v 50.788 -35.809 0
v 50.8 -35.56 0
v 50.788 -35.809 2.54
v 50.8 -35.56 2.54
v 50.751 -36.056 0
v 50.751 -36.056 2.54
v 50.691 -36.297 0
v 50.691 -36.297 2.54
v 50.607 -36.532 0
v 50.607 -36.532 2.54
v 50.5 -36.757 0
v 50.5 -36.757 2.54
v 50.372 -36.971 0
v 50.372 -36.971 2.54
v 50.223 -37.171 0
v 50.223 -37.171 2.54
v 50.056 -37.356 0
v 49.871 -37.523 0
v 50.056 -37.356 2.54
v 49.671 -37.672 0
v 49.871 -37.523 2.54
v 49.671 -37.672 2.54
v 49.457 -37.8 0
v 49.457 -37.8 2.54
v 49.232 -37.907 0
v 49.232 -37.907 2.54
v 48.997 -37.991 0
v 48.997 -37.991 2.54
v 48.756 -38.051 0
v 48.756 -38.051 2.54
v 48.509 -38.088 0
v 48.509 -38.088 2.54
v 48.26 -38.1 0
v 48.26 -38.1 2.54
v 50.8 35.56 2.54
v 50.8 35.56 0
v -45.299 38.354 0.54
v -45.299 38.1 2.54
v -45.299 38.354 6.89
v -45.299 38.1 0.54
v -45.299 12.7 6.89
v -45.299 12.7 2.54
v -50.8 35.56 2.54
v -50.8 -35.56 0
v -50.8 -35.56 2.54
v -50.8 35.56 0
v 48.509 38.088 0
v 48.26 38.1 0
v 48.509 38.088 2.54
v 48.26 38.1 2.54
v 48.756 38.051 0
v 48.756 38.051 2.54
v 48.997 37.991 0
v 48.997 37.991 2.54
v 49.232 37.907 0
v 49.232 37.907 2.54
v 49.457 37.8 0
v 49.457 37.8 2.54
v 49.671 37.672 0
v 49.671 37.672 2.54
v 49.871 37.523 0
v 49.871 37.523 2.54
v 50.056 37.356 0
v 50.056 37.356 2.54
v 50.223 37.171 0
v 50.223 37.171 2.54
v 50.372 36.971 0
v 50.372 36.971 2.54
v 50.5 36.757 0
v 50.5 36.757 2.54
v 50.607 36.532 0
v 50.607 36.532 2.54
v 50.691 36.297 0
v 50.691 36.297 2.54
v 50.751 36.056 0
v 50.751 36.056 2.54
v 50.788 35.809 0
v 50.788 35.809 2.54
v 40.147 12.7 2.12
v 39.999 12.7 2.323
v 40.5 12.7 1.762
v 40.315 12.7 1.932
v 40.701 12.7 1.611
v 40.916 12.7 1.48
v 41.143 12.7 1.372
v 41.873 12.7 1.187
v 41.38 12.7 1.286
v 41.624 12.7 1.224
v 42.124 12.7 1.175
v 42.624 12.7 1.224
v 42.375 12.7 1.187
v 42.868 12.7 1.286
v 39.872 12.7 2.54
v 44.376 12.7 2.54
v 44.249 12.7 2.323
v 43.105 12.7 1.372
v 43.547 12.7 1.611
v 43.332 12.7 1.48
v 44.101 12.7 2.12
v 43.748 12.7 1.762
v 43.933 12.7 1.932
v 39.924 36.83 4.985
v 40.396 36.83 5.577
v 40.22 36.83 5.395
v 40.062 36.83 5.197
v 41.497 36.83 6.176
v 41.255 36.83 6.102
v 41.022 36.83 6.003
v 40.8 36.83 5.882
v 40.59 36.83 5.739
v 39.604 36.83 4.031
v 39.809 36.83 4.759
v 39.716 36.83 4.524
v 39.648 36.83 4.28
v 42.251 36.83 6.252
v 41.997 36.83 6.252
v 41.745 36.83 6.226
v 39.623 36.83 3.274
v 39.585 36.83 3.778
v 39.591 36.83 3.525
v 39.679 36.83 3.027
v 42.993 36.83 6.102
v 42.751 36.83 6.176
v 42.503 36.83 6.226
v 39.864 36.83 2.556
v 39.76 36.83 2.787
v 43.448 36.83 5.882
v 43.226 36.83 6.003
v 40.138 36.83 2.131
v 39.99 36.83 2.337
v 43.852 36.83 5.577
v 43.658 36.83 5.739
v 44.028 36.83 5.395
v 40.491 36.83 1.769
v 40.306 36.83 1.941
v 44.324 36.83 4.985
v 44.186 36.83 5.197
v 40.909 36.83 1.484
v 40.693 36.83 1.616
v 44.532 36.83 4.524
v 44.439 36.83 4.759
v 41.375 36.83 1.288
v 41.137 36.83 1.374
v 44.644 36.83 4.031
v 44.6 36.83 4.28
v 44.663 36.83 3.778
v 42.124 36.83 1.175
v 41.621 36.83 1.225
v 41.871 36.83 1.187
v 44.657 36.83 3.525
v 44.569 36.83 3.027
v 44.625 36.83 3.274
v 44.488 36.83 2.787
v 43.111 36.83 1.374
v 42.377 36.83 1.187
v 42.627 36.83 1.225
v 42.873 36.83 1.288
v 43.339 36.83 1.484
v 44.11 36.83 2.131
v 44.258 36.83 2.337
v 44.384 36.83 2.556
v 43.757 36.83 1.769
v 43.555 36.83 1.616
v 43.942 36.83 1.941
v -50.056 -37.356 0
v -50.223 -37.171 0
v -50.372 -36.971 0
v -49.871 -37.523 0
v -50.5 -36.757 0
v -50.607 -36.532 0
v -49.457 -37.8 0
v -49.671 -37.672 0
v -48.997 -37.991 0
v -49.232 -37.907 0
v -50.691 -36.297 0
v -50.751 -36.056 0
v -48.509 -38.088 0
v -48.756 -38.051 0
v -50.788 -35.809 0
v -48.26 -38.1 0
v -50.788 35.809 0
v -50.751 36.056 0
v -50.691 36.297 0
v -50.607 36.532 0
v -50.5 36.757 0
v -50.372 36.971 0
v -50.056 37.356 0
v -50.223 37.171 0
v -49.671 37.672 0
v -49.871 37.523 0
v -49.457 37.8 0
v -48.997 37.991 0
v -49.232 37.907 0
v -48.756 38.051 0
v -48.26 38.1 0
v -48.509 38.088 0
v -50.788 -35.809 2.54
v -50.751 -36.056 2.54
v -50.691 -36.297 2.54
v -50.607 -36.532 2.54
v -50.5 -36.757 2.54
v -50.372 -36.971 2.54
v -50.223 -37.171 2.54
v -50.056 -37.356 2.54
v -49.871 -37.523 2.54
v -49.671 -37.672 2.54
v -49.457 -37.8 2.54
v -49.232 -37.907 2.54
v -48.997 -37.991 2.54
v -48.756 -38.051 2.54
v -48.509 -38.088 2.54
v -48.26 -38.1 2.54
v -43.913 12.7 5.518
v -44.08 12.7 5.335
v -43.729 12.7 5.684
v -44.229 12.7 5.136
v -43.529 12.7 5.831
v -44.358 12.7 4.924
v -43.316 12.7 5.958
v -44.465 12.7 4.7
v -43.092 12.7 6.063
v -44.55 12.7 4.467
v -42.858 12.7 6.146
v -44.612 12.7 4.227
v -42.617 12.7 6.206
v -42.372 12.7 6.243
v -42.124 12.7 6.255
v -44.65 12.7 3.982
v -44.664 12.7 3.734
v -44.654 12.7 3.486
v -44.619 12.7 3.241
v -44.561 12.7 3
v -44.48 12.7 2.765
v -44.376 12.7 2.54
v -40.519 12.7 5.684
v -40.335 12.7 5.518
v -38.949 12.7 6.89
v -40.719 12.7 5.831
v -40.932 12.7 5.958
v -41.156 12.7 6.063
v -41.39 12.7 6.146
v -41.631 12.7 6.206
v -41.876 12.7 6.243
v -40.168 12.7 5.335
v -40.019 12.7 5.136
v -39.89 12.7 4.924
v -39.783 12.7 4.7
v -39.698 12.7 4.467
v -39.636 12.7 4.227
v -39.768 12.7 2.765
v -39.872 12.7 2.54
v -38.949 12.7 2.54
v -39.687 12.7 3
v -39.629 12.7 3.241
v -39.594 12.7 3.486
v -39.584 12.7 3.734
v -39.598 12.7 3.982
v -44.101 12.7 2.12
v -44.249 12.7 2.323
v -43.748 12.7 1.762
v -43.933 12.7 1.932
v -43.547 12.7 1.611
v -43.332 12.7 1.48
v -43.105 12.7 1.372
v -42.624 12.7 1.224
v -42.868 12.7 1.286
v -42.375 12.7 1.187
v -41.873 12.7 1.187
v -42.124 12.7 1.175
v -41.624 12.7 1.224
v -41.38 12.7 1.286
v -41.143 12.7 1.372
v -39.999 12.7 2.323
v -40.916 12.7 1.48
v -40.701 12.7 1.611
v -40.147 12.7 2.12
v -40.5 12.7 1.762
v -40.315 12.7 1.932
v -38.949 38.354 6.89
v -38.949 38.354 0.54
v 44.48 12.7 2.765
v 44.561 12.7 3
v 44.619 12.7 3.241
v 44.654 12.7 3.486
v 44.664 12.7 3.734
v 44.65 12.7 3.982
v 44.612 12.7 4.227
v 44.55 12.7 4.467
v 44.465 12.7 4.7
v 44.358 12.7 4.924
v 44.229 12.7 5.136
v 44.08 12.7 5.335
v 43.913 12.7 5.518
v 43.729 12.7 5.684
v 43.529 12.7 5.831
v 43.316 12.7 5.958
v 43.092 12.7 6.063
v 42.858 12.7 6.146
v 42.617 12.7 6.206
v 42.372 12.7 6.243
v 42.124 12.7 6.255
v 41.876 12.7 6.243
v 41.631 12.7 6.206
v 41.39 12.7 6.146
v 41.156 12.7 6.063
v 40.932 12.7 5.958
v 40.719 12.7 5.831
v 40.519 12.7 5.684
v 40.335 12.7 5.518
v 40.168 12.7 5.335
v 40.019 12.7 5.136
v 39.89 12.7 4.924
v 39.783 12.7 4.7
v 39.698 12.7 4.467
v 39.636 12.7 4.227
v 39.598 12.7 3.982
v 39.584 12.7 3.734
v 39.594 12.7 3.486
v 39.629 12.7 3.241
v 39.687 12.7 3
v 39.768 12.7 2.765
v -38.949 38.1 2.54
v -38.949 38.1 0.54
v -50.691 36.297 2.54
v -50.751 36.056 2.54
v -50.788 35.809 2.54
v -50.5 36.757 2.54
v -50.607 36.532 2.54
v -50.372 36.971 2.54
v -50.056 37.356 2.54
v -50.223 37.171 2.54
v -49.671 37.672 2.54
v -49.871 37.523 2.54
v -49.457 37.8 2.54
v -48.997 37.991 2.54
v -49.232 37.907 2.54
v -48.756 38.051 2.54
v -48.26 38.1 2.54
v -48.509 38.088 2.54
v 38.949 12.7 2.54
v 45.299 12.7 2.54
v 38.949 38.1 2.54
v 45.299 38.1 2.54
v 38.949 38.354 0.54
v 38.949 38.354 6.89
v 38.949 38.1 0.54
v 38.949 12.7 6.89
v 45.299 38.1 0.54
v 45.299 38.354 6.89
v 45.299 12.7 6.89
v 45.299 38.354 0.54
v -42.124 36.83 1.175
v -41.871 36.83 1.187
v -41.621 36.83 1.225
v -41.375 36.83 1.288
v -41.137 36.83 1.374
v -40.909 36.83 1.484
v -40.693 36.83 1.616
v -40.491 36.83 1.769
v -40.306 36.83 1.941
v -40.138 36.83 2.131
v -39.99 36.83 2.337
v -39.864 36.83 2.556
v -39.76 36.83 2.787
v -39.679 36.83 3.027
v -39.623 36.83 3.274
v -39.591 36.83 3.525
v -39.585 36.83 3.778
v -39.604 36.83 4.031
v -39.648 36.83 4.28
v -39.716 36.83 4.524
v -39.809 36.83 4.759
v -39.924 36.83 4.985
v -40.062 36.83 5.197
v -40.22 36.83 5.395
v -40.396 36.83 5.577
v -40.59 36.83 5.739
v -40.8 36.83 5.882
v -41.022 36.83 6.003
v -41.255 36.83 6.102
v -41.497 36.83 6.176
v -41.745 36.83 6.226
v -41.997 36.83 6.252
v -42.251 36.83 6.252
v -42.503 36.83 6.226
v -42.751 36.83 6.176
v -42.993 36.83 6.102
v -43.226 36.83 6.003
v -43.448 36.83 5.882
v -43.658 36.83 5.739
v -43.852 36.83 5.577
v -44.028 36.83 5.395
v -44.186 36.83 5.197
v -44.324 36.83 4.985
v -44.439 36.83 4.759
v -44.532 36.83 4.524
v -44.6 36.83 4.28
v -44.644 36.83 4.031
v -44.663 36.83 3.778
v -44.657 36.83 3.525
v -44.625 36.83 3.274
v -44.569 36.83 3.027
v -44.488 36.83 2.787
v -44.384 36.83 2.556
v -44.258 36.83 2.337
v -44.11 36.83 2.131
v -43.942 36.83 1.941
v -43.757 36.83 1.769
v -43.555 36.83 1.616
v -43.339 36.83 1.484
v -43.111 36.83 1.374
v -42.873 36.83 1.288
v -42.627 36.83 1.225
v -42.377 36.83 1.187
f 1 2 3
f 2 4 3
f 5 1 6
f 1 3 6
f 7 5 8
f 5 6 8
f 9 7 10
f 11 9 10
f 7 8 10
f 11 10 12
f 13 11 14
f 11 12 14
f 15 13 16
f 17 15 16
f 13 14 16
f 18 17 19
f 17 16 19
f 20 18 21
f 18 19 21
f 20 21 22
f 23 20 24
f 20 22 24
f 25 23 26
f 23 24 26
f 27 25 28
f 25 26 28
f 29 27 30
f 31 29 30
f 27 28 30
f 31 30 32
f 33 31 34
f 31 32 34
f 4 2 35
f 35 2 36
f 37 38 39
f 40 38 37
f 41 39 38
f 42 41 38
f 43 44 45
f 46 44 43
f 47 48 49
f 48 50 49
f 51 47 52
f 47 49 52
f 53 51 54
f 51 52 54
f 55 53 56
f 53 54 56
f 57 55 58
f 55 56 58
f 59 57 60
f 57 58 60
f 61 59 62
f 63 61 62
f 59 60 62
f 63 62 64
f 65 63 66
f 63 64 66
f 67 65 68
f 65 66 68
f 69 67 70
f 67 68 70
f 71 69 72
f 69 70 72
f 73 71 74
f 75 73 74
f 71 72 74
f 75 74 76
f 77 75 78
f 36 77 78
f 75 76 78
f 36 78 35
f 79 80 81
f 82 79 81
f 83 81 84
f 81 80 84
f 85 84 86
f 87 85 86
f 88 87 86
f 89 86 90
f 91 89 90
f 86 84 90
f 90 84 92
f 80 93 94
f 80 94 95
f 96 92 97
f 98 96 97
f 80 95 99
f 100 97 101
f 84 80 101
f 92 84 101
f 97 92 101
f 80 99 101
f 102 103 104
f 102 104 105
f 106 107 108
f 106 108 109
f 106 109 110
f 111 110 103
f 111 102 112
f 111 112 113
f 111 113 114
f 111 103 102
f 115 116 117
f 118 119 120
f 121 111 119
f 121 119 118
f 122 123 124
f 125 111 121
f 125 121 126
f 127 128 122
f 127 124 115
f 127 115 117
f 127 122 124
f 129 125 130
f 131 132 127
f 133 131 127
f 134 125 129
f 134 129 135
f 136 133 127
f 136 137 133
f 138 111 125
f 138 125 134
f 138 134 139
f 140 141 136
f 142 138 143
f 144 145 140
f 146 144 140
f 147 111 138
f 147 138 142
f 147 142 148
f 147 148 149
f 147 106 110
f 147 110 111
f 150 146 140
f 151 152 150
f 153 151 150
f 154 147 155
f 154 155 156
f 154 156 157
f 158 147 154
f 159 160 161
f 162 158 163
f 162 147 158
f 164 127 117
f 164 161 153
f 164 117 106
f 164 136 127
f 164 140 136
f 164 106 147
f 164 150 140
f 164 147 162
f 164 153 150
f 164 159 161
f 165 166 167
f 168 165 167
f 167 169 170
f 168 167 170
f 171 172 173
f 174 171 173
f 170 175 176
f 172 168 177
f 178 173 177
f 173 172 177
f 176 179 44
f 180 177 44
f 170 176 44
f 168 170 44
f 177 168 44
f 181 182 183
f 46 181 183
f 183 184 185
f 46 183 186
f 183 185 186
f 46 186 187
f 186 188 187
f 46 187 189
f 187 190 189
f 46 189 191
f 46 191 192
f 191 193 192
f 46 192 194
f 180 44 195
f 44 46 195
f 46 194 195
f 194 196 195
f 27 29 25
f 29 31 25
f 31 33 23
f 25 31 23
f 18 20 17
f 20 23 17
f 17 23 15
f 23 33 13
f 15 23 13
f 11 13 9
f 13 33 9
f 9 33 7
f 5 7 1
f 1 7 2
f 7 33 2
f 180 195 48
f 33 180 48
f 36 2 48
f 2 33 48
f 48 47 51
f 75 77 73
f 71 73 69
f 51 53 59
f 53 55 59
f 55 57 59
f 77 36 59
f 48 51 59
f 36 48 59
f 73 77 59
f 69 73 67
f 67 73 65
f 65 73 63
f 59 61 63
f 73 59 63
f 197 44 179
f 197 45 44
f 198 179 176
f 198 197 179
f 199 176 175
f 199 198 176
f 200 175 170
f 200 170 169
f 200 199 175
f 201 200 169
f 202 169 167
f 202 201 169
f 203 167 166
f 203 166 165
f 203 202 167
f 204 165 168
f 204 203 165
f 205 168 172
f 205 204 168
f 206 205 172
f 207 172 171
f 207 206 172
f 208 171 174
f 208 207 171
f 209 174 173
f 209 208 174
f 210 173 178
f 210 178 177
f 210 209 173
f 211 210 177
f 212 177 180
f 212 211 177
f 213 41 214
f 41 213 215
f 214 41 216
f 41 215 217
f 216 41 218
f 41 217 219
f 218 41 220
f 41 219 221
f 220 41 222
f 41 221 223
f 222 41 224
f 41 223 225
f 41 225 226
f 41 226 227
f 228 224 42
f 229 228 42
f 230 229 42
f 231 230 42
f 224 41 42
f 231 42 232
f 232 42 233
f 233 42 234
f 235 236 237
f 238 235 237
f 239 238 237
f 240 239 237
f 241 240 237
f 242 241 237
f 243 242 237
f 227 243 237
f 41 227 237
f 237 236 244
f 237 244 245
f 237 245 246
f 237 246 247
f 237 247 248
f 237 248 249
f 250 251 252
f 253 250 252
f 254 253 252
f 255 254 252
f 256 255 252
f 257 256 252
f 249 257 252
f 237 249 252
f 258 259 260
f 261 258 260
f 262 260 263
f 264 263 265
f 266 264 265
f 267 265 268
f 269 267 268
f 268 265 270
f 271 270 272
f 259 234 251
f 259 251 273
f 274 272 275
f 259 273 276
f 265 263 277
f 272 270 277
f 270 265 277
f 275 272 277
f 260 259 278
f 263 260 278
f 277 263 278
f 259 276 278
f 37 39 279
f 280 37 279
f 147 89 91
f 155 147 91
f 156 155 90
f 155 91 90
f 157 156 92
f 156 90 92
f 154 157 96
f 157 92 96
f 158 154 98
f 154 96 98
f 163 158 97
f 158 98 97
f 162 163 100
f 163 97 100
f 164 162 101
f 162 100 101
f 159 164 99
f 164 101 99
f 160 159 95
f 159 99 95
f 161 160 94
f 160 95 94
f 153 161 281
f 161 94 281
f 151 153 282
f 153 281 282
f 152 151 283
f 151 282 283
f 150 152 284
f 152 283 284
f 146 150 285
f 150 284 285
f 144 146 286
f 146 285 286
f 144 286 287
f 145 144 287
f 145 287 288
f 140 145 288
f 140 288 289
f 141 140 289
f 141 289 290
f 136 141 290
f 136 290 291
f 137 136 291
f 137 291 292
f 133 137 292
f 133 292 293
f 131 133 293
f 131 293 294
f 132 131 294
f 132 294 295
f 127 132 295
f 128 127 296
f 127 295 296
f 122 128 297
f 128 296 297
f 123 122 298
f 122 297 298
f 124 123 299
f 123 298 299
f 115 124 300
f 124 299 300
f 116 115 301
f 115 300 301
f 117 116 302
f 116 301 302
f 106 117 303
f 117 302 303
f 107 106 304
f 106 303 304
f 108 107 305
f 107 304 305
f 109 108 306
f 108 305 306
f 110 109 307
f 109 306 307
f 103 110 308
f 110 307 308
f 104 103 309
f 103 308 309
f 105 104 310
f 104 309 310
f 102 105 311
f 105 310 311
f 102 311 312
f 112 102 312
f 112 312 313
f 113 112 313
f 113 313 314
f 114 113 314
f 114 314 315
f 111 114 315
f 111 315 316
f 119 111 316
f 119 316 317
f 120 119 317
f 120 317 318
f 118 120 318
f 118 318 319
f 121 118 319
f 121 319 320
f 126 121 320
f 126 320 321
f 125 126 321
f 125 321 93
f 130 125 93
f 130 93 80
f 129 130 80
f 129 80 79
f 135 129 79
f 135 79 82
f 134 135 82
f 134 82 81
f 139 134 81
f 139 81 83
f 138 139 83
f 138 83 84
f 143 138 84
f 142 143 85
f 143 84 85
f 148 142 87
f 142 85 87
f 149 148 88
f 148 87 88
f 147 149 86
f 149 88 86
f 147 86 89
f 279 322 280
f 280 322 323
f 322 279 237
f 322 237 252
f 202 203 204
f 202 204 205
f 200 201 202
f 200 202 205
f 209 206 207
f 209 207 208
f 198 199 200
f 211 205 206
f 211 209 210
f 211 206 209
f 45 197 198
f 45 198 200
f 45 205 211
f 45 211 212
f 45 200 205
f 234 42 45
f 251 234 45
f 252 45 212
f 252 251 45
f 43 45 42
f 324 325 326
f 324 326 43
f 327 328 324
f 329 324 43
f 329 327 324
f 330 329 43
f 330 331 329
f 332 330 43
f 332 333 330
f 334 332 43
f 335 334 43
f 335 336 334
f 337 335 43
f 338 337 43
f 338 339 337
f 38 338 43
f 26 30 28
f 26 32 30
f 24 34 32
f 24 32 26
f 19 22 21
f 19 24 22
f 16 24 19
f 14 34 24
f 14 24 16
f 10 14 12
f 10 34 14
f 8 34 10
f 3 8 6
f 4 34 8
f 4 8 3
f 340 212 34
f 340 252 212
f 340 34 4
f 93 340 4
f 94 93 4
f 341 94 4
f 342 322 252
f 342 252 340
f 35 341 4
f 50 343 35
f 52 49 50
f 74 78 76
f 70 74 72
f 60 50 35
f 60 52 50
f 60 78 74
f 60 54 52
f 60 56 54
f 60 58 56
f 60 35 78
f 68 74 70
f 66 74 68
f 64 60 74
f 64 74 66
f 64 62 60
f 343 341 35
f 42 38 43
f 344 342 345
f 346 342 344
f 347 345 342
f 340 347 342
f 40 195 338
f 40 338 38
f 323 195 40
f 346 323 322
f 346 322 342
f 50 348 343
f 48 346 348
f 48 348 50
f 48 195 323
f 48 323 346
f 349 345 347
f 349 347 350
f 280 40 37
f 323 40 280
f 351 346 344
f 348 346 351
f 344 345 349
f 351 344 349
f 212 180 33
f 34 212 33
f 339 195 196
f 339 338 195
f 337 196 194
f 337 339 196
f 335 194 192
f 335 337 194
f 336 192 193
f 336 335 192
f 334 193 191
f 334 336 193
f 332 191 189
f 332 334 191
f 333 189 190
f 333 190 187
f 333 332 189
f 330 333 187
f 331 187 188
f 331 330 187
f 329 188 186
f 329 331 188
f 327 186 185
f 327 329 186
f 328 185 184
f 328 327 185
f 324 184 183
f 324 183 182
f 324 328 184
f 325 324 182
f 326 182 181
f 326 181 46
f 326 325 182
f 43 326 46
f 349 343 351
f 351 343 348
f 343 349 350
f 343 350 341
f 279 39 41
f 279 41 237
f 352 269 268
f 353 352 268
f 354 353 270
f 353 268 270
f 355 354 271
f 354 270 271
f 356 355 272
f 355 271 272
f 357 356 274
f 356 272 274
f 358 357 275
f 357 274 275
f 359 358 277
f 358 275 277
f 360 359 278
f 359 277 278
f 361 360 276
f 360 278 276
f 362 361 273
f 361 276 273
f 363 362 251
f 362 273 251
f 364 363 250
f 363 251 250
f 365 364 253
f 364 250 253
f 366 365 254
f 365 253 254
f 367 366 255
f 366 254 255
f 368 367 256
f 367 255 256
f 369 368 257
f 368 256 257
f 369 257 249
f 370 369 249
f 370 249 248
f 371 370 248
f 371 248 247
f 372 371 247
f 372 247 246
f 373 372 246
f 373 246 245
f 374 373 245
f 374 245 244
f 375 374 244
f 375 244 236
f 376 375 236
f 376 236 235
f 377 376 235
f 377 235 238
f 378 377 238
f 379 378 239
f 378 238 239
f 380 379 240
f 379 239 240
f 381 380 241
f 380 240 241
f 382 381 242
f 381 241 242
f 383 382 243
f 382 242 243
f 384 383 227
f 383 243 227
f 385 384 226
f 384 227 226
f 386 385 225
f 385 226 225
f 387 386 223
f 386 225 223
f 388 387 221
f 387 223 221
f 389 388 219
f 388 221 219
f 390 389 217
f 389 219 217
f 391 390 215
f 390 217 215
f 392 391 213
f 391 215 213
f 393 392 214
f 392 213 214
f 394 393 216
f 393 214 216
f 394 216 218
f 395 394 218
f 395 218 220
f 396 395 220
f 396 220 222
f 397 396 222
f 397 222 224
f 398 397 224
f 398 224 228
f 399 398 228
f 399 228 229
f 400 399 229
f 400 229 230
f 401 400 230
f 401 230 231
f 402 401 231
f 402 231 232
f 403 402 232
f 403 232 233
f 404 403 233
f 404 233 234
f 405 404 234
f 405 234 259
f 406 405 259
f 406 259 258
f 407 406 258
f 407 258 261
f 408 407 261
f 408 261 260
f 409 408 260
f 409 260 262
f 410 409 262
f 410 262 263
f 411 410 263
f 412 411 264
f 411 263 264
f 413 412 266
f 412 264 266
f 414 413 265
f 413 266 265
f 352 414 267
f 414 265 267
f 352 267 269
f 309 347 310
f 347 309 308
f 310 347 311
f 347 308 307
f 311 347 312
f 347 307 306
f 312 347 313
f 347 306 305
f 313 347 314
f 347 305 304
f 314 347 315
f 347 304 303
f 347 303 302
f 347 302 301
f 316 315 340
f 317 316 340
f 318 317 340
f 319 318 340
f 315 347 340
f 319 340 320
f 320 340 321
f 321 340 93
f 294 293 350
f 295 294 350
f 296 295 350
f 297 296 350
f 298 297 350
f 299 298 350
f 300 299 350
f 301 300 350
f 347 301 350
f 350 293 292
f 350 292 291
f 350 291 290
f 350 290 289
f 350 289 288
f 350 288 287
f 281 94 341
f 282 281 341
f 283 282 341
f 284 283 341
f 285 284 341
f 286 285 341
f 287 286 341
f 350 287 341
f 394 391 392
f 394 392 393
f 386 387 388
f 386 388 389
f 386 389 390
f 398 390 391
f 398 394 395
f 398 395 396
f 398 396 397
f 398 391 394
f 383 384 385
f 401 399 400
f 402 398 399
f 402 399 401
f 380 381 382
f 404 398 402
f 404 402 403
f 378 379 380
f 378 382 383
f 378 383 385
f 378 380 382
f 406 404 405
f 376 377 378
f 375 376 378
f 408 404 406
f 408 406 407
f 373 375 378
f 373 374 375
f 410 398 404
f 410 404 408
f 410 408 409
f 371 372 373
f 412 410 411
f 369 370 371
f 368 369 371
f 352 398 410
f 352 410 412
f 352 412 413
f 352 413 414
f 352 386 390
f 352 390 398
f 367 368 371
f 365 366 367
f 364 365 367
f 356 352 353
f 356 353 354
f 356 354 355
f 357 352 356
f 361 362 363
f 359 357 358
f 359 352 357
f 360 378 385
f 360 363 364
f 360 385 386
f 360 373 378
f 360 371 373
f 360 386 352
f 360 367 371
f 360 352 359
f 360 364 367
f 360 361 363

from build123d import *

# Parameters (mm, degrees)
SKETCH1_W           = 101.6
SKETCH1_H           = 76.2
BOSS_EXTRUDE1_DEPTH = 2.54
SKETCH2_R           = 1.5875
SKETCH2_R_2         = 1.3335
BOSS_EXTRUDE2_DEPTH = 25.4
BOSS_EXTRUDE3_START = 0.254
SKETCH3_R           = 1.5875
BOSS_EXTRUDE3_DEPTH = 0.254
FILLET1_R           = 2.54
BOSS_EXTRUDE4_START = -25.654
SKETCH4_W           = 6.35
SKETCH4_H           = 6.35
BOSS_EXTRUDE4_DEPTH = 25.654
SKETCH5_R           = 2.54
CUT_EXTRUDE1_DEPTH  = 24.13


with BuildPart() as part:
    # Sketch1 → Boss-Extrude1 (new body)
    with BuildSketch(Plane.XY):
        Rectangle(SKETCH1_W, SKETCH1_H)
    extrude(amount=BOSS_EXTRUDE1_DEPTH)

    # Sketch2 → Boss-Extrude2 (add)
    # profile 1 of 2: a face of its own
    with BuildSketch(Plane(origin=(0, 38.1, 0), x_dir=(1, 0, 0), z_dir=(0, 1, 0))):
        with Locations((-42.123995, -3.71475)):
            Circle(SKETCH2_R)
        with Locations((-42.123995, -3.71475)):
            Circle(SKETCH2_R_2, mode=Mode.SUBTRACT)
    # profile 2 of 2: a face of its own
    with BuildSketch(Plane(origin=(0, 38.1, 0), x_dir=(1, 0, 0), z_dir=(0, 1, 0))):
        with Locations((42.123995, -3.71475)):
            Circle(SKETCH2_R)
        with Locations((42.123995, -3.71475)):
            Circle(SKETCH2_R_2, mode=Mode.SUBTRACT)
    extrude(amount=-BOSS_EXTRUDE2_DEPTH)

    # Sketch3 → Boss-Extrude3 (add)
    with BuildSketch(Plane(origin=(0, 38.1, 0), x_dir=(1, 0, 0), z_dir=(0, 1, 0)).offset(BOSS_EXTRUDE3_START)):
        with Locations(Location((-42.123995, -3.71475, 0), (0, 0, 270))):
            Circle(SKETCH3_R)
        with Locations(Location((42.123995, -3.71475, 0), (0, 0, 132.26858443))):
            Circle(SKETCH3_R)
    extrude(amount=-BOSS_EXTRUDE3_DEPTH)

    # Fillet1
    fillet1_edges = [part.edges().sort_by_distance(p)[0] for p in [
        (50.8, -38.1, 1.27),
        (-50.8, -38.1, 1.27),
        (-50.8, 38.1, 1.27),
        (50.8, 38.1, 1.27),
    ]]
    fillet(fillet1_edges, radius=FILLET1_R)

    # Sketch4 → Boss-Extrude4 (add)
    with BuildSketch(Plane(origin=(0, 38.354, 0), x_dir=(1, 0, 0), z_dir=(0, 1, 0)).offset(BOSS_EXTRUDE4_START)):
        with Locations((-42.123995, -3.71475)):
            Rectangle(SKETCH4_W, SKETCH4_H)
        with Locations((42.123995, -3.71475)):
            Rectangle(SKETCH4_W, SKETCH4_H)
    extrude(amount=BOSS_EXTRUDE4_DEPTH)

    # Sketch5 → Cut-Extrude1 (cut)
    with BuildSketch(Plane.XZ.offset(-12.7)):
        with Locations(Location((-42.123995, 3.71475, 0), (0, 0, 270))):
            Circle(SKETCH5_R)
        with Locations(Location((42.123995, 3.71475, 0), (0, 0, 270))):
            Circle(SKETCH5_R)
    extrude(amount=-CUT_EXTRUDE1_DEPTH, mode=Mode.SUBTRACT)


solid = part.part
